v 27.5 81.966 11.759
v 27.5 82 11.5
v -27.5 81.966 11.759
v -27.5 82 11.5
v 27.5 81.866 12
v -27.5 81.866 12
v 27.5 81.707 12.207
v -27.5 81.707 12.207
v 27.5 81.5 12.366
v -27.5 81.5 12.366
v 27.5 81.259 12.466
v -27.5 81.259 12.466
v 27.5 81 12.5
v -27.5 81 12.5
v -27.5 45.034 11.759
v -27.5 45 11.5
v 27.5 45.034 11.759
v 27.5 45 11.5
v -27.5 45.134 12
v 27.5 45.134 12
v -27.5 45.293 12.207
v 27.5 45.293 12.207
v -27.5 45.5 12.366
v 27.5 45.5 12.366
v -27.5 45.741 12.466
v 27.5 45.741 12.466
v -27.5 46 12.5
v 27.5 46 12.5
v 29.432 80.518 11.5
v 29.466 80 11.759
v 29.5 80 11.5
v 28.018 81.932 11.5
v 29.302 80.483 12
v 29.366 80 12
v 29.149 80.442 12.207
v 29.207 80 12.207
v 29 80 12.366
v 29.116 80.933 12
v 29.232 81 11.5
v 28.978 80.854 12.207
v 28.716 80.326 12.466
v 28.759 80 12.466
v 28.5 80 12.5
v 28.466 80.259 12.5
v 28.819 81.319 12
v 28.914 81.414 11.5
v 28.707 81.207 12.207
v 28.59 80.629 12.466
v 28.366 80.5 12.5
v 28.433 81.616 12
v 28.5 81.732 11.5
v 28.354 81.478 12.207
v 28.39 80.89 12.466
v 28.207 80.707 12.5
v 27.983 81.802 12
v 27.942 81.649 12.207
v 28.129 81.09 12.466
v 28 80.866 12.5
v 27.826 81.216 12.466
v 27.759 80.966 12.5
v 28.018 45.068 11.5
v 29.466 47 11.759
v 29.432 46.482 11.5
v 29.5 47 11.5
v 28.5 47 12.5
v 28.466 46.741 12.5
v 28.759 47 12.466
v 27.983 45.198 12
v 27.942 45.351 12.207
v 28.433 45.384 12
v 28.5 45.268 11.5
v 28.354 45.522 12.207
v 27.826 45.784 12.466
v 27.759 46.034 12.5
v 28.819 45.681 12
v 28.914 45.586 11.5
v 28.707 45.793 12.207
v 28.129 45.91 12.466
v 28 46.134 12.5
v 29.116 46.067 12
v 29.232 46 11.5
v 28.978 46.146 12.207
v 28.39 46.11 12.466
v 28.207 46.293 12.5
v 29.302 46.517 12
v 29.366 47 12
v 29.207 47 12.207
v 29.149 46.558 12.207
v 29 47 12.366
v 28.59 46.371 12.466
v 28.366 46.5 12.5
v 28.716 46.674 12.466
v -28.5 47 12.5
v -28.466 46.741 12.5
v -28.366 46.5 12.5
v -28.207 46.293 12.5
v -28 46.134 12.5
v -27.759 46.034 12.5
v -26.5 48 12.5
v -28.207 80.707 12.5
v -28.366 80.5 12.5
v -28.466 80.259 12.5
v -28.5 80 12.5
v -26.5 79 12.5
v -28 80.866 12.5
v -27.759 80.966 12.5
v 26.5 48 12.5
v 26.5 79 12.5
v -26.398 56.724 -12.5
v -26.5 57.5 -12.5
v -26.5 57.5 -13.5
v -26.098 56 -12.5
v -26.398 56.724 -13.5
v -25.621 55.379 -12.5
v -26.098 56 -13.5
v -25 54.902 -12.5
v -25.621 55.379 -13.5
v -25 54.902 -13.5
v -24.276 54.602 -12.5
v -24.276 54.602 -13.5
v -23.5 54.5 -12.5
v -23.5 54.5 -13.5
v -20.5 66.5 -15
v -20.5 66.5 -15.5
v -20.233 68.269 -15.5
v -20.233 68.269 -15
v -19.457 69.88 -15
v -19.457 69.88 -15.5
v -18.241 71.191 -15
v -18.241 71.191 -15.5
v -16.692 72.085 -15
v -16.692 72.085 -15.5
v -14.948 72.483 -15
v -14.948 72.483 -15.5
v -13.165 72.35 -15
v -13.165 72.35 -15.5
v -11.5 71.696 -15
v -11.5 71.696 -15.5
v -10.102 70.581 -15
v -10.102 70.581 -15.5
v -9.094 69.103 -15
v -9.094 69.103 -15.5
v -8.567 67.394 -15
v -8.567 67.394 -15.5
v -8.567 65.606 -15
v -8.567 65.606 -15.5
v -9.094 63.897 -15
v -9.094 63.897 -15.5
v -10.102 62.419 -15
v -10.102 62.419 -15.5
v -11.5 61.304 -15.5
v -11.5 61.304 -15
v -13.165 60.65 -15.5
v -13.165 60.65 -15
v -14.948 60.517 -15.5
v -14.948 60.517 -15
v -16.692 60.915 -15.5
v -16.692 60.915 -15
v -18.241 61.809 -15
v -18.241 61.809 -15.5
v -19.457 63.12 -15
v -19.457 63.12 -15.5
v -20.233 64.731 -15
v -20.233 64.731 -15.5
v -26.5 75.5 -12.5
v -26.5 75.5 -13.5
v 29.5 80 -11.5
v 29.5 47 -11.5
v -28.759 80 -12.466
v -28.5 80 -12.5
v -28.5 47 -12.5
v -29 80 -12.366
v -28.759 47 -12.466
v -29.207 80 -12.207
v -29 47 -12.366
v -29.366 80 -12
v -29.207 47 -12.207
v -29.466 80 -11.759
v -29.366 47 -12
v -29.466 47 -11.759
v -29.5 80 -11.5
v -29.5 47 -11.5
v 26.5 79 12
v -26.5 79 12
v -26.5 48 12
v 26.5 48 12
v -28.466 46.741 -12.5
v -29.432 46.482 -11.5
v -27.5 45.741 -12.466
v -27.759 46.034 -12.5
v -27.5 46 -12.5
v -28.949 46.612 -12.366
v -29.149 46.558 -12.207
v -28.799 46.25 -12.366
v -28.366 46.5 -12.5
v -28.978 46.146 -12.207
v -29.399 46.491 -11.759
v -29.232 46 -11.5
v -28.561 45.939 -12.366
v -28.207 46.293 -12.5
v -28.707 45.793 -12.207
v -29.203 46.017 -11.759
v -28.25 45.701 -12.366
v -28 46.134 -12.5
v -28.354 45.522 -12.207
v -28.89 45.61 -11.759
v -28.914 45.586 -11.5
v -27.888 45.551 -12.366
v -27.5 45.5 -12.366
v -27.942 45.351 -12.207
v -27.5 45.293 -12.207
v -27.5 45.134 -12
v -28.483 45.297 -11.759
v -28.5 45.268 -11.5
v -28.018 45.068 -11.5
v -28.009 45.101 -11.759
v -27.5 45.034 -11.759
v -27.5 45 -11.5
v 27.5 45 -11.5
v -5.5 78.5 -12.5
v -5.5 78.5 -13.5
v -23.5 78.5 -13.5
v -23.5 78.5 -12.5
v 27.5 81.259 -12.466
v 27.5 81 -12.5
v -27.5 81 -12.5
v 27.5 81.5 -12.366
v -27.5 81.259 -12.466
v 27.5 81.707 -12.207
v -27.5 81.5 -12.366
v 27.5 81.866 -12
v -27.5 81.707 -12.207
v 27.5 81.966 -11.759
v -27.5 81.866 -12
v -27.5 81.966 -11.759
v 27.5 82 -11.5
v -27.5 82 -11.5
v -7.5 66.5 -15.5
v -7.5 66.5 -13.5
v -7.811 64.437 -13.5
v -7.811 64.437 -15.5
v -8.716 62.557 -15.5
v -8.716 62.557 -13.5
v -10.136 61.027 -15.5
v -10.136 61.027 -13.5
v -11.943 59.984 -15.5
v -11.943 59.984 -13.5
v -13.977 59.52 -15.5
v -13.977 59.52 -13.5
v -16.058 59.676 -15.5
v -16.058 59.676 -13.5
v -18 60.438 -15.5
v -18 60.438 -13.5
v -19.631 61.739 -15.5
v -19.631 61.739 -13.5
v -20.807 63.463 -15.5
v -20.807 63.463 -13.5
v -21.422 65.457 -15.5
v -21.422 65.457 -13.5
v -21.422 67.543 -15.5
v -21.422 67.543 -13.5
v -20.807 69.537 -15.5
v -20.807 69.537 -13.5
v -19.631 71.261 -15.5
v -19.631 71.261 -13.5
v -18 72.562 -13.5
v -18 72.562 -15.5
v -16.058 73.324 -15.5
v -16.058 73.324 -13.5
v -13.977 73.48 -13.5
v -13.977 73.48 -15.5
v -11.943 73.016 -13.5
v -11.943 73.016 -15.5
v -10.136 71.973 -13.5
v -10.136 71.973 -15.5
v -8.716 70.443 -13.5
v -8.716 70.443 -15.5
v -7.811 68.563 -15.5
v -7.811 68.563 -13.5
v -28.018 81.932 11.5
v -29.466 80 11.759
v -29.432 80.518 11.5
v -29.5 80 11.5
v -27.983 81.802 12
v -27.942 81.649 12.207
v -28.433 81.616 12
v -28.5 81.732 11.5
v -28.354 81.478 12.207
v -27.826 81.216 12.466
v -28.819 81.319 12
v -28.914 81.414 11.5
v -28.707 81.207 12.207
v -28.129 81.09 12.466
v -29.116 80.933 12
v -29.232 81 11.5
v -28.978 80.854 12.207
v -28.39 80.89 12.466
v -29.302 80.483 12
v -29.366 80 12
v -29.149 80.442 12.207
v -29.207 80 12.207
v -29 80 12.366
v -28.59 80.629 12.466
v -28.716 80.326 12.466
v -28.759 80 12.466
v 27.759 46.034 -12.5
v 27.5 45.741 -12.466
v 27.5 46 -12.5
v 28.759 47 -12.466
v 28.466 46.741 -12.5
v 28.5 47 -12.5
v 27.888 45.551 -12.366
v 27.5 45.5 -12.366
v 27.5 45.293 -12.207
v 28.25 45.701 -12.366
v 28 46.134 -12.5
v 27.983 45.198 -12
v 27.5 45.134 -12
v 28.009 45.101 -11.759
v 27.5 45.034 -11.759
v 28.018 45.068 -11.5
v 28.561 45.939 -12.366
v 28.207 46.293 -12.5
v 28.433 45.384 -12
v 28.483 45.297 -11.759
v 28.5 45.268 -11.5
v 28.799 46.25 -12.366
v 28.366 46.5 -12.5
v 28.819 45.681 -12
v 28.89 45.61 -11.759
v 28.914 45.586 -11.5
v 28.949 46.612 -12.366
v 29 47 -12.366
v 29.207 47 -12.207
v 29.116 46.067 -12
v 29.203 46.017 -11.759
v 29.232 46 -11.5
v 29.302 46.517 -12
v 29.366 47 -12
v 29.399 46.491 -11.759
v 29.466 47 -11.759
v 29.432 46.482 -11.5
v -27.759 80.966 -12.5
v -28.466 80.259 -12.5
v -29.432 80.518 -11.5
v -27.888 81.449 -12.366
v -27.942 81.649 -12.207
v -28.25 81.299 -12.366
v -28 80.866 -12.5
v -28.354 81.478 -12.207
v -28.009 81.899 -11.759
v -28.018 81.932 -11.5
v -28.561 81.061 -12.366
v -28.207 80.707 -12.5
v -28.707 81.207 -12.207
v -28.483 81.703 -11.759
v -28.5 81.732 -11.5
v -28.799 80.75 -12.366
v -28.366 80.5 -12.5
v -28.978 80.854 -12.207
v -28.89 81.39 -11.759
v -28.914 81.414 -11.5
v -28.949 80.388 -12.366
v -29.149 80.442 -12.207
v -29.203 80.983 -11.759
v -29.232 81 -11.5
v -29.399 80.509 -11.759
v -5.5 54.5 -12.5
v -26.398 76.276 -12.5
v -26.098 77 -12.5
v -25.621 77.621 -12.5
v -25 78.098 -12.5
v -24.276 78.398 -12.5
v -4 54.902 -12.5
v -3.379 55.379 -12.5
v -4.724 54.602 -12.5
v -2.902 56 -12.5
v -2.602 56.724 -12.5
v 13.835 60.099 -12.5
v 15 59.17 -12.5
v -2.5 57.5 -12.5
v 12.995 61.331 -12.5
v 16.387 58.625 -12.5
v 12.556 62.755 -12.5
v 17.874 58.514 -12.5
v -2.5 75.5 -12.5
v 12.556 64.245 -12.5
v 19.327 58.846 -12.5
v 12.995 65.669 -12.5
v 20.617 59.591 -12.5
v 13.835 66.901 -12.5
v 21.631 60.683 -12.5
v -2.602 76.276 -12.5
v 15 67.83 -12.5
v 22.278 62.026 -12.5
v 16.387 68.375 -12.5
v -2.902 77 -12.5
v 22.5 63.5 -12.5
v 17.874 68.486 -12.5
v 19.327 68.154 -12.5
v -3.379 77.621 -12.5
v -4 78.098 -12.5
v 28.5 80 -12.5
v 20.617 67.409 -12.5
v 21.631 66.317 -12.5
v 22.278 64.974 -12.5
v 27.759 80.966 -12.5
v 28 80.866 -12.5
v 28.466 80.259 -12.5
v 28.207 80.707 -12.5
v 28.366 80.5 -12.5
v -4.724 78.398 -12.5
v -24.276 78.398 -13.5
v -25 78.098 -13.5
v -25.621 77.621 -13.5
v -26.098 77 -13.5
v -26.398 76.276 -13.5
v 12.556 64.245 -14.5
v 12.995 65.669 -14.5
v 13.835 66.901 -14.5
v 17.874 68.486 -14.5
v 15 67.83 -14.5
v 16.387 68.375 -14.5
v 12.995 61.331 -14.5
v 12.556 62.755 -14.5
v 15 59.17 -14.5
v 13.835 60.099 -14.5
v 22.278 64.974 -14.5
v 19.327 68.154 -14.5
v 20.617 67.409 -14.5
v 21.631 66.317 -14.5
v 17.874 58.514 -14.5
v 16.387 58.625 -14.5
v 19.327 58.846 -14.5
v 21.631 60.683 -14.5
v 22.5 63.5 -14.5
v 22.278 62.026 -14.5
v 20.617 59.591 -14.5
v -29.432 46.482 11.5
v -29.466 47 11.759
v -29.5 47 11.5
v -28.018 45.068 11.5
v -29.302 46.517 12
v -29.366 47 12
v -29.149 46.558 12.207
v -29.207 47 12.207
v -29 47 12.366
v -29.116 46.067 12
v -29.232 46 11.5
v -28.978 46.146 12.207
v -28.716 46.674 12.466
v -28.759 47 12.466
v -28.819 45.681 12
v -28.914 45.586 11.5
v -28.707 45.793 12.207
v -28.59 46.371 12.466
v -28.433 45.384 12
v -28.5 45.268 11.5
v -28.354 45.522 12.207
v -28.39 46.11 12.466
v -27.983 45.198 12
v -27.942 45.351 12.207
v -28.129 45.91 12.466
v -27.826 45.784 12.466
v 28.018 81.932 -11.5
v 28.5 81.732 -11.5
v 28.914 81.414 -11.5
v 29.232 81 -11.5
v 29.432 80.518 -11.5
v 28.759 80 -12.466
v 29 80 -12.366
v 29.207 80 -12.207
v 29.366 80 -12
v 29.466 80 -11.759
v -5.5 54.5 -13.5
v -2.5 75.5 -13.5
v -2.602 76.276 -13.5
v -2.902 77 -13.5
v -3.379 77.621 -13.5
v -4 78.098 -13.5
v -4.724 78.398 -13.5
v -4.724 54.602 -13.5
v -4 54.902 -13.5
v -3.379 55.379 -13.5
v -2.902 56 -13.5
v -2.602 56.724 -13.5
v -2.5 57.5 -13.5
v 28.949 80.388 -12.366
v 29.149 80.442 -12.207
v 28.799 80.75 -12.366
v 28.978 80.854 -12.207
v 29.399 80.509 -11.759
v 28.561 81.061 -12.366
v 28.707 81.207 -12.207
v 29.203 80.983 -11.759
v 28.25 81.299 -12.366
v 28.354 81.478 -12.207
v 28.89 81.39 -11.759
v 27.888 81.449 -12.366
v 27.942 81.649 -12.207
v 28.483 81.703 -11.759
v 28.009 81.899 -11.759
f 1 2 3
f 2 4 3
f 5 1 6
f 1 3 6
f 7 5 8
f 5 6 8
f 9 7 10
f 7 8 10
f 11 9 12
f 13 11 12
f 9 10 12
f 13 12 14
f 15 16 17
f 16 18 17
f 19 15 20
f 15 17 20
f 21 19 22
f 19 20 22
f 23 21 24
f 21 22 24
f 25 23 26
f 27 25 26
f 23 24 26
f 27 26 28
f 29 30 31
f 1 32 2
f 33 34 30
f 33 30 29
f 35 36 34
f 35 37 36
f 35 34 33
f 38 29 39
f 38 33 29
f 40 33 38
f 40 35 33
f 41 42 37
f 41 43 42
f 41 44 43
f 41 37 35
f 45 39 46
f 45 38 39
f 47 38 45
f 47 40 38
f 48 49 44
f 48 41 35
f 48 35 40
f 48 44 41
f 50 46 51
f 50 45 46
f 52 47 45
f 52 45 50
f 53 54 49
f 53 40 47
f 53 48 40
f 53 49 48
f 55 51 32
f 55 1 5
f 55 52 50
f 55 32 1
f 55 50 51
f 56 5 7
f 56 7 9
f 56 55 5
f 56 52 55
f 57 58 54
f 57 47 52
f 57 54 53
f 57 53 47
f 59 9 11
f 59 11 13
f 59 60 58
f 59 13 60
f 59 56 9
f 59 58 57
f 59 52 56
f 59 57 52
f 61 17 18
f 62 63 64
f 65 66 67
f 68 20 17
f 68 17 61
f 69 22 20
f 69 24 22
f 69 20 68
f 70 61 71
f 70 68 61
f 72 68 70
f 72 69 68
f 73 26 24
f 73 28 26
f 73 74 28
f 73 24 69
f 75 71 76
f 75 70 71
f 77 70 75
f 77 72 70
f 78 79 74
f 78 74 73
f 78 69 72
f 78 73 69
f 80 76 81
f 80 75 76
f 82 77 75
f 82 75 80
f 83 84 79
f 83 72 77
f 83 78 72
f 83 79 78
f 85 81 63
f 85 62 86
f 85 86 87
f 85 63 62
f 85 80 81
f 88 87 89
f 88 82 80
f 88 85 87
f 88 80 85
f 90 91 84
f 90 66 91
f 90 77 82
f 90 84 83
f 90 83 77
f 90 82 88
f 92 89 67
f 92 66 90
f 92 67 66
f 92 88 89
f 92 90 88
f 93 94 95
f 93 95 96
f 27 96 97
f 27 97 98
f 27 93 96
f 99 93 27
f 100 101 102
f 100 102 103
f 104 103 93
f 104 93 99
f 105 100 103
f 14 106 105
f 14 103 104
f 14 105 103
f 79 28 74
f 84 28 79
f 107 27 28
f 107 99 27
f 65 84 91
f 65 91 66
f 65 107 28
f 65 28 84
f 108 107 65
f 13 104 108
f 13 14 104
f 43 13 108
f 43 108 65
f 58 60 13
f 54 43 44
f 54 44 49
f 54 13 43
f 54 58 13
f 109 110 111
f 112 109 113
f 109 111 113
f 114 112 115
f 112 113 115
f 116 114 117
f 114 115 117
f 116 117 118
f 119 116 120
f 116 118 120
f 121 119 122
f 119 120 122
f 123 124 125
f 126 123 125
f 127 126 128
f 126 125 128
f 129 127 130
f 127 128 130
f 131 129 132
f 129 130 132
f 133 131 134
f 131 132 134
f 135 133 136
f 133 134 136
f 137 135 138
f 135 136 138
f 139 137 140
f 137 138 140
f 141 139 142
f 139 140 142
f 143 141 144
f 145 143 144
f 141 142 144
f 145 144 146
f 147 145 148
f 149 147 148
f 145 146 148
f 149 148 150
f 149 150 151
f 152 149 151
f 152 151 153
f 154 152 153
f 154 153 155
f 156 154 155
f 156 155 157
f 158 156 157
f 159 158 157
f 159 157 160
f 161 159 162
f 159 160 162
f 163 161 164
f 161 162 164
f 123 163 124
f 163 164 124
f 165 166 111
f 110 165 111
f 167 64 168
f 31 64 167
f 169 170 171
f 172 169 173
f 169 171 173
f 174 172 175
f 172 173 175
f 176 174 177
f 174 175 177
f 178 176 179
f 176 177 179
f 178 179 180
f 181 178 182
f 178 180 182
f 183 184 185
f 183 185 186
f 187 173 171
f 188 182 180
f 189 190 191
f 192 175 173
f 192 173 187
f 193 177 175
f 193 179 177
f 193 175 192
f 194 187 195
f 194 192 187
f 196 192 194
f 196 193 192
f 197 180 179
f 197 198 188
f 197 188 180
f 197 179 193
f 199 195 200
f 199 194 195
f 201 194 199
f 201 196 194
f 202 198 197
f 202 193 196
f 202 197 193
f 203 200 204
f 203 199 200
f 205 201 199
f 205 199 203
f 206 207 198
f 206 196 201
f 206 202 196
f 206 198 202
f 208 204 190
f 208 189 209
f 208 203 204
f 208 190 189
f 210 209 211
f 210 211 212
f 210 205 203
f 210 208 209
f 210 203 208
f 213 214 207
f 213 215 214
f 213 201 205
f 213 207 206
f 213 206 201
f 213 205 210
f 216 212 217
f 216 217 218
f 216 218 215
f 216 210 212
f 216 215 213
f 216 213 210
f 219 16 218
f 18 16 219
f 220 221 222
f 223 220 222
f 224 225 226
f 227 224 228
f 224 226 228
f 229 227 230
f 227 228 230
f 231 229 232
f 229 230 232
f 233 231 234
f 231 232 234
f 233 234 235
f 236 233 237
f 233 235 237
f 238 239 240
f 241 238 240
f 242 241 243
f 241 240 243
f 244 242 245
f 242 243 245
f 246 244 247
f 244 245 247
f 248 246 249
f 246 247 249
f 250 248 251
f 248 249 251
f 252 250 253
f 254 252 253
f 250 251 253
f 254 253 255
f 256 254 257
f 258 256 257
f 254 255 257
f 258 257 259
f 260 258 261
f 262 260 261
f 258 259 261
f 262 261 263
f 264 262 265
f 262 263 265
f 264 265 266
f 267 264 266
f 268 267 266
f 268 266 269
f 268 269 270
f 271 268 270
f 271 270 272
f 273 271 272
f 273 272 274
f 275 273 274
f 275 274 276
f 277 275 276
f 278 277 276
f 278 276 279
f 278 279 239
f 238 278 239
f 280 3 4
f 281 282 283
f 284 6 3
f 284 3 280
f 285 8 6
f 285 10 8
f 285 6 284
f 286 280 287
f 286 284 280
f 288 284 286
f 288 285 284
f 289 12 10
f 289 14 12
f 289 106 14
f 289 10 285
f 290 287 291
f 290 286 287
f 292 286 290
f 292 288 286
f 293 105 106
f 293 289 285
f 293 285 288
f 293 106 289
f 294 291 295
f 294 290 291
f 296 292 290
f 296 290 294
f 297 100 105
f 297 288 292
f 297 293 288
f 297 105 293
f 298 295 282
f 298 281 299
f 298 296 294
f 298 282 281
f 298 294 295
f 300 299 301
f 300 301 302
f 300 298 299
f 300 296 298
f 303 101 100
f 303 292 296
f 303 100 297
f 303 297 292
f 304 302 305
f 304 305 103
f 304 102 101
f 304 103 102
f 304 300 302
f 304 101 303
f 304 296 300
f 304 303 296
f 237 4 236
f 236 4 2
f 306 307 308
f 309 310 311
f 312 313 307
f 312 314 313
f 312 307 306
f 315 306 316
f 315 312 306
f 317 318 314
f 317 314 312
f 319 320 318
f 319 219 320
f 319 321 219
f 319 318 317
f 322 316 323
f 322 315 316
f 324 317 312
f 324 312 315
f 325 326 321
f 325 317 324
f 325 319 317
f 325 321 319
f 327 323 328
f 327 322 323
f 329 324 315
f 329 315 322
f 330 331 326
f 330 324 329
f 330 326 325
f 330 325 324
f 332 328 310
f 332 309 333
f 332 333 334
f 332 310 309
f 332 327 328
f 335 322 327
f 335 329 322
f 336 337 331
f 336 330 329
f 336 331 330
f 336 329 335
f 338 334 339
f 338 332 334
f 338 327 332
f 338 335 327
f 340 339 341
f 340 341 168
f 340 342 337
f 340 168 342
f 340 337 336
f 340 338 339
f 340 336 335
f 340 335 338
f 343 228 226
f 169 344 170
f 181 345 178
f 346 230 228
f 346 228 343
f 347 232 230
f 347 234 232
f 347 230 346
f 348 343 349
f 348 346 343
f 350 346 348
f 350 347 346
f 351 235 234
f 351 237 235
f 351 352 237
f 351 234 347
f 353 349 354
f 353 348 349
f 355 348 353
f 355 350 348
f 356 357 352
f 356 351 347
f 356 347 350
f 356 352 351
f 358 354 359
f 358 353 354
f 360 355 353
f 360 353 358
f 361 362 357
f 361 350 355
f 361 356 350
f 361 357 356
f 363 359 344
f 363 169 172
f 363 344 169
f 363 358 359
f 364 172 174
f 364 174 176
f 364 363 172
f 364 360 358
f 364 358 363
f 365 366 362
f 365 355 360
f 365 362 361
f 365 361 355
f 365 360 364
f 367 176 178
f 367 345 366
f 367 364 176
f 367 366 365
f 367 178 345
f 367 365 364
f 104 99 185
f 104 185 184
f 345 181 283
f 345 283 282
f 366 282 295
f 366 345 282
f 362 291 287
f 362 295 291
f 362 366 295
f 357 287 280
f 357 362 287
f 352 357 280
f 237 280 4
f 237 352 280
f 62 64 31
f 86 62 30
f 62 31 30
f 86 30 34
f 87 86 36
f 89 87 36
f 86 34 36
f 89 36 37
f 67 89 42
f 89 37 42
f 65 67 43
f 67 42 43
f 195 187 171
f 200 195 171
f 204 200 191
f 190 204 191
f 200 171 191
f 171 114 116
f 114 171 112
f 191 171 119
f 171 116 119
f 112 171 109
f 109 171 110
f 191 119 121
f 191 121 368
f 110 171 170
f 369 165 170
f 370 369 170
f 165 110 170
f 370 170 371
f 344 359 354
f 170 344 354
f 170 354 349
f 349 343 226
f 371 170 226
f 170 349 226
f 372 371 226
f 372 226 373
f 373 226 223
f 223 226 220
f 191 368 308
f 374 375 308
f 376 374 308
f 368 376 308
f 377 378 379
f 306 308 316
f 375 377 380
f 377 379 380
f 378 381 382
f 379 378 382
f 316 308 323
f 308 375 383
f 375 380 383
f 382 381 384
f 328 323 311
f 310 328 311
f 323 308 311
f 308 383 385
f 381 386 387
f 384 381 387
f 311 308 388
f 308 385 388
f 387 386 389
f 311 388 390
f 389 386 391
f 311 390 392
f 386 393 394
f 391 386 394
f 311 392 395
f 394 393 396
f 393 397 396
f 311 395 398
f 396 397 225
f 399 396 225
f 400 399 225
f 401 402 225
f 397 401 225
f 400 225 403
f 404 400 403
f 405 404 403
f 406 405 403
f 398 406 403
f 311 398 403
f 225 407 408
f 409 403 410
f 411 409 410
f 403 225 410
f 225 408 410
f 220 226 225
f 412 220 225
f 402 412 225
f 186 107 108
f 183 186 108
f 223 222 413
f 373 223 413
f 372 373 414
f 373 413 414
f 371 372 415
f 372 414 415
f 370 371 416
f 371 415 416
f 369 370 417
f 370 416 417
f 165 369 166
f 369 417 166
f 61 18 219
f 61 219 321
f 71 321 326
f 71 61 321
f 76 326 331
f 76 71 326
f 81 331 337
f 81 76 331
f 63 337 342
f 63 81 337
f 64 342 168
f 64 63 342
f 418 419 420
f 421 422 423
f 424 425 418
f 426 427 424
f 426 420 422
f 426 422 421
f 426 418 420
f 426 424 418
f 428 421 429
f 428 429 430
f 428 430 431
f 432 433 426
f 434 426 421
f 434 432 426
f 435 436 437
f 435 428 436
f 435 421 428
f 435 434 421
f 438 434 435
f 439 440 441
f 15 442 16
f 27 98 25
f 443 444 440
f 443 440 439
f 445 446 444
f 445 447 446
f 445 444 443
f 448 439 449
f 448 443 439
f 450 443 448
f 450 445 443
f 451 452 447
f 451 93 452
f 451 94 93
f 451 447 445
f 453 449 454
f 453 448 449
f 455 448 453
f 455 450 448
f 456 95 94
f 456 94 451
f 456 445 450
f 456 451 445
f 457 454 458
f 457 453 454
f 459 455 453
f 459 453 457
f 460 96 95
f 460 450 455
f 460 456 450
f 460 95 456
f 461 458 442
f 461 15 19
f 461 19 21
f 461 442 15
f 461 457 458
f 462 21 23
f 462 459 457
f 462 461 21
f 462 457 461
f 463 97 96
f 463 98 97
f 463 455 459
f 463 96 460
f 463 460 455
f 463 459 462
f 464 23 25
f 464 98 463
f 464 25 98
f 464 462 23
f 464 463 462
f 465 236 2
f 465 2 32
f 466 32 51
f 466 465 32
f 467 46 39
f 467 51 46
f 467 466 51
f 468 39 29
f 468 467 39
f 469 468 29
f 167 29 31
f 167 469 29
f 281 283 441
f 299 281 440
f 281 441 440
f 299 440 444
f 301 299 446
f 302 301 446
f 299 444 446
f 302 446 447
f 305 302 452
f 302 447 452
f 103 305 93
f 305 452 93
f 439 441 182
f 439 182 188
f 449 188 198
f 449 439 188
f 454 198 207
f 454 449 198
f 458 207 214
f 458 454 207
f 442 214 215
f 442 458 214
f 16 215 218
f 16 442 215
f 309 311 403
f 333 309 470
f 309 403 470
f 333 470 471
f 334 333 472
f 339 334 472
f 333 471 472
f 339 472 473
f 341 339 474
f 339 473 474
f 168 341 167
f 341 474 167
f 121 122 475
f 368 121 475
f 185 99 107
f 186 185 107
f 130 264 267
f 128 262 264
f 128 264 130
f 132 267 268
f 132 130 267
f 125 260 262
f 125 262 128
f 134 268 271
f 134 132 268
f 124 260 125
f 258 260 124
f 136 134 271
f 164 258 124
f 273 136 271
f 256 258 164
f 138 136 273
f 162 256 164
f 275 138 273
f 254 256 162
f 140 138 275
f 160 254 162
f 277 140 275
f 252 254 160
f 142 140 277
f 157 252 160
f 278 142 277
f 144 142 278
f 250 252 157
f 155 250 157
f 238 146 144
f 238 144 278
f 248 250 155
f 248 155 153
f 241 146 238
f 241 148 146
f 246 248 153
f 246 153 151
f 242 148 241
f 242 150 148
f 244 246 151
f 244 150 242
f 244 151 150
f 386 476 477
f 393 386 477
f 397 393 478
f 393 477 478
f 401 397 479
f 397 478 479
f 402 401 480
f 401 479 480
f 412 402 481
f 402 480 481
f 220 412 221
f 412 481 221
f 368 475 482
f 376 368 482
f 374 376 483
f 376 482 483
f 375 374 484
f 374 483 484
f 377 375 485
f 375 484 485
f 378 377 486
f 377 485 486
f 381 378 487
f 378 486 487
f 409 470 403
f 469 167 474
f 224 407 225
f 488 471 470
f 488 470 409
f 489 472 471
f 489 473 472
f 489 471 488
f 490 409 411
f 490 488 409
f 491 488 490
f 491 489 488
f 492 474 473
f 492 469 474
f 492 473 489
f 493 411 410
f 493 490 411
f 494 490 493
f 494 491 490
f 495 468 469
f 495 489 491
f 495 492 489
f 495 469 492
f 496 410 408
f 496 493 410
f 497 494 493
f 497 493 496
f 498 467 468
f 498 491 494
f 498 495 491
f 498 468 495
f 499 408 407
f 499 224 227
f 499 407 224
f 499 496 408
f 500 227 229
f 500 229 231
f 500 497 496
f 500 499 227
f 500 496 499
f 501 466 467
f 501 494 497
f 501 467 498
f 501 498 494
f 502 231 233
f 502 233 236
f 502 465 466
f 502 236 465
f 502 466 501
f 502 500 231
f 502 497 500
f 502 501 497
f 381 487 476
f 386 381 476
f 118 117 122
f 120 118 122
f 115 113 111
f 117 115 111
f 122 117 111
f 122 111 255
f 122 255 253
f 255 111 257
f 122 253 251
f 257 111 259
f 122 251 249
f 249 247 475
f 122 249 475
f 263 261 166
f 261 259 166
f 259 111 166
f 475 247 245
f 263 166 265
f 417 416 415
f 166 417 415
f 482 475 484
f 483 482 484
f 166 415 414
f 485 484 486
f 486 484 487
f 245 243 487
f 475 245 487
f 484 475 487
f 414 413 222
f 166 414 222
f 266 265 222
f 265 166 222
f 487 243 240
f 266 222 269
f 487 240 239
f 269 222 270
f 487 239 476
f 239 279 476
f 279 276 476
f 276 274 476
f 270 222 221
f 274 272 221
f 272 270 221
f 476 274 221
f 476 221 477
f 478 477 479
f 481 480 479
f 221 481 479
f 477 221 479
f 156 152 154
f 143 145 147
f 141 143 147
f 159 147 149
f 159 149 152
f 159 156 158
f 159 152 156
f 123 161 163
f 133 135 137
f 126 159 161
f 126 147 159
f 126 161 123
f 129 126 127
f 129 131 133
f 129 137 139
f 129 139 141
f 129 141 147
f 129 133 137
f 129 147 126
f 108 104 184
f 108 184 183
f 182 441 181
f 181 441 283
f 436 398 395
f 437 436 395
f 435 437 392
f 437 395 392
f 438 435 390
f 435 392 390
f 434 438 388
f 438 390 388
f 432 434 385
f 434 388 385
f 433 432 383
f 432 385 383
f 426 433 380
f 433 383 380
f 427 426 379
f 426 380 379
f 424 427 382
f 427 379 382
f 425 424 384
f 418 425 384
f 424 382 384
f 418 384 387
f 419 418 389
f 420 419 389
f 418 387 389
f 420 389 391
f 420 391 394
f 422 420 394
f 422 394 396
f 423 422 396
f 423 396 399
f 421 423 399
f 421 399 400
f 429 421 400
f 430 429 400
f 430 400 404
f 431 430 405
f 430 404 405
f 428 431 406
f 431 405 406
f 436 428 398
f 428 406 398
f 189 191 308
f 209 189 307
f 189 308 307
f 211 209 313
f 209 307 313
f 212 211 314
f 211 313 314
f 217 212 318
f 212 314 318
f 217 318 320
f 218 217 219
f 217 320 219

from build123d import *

# Parameters (mm, degrees)
SKETCH1_W           = 59
SKETCH1_H           = 37
BOSS_EXTRUDE1_DEPTH = 12.5
SKETCH2_R           = 7
BOSS_EXTRUDE2_DEPTH = 3
FILLET1_R           = 2
BOSS_EXTRUDE3_DEPTH = 1
SKETCH4_R           = 6
CUT_EXTRUDE1_DEPTH  = 0.5
SKETCH5_R           = 5
BOSS_EXTRUDE4_DEPTH = 2
FILLET2_R           = 1
SKETCH6_W           = 53
SKETCH6_H           = 31
CUT_EXTRUDE2_DEPTH  = 0.5


with BuildPart() as part:
    # Sketch1 → Boss-Extrude1 (new, symmetric)
    with BuildSketch(Plane.XY):
        with Locations((0, 63.5)):
            Rectangle(SKETCH1_W, SKETCH1_H)
    extrude(amount=BOSS_EXTRUDE1_DEPTH, both=True)

    # Sketch2 → Boss-Extrude2 (add)
    with BuildSketch(Plane(origin=(0, 0, -12.5), x_dir=(-1, 0, 0), z_dir=(0, 0, -1))):
        with Locations(Location((14.5, 66.5, 0), (0, 0, 180))):
            Circle(SKETCH2_R)
    extrude(amount=BOSS_EXTRUDE2_DEPTH)

    # Fillet1
    fillet1_edges = [part.edges().sort_by_distance(p)[0] for p in [
        (-29.5, 82, 0),
        (29.5, 82, 0),
        (29.5, 45, 0),
        (-29.5, 45, 0),
    ]]
    fillet(fillet1_edges, radius=FILLET1_R)

    # Sketch3 → Boss-Extrude3 (add, symmetric)
    with BuildSketch(Plane(origin=(0, 0, -12.5), x_dir=(-1, 0, 0), z_dir=(0, 0, -1))):
        with BuildLine():
            Line((5.5, 78.5), (23.5, 78.5))
            ThreePointArc((23.5, 78.5), (25.621320344, 77.621320344), (26.5, 75.5))
            Line((26.5, 75.5), (26.5, 57.5))
            ThreePointArc((26.5, 57.5), (25.621320344, 55.378679656), (23.5, 54.5))
            Line((23.5, 54.5), (5.5, 54.5))
            ThreePointArc((5.5, 54.5), (3.378679656, 55.378679656), (2.5, 57.5))
            Line((2.5, 57.5), (2.5, 75.5))
            ThreePointArc((2.5, 75.5), (3.378679656, 77.621320344), (5.5, 78.5))
        make_face()
    extrude(amount=BOSS_EXTRUDE3_DEPTH, both=True)

    # Sketch4 → Cut-Extrude1 (cut)
    with BuildSketch(Plane(origin=(0, 0, -15.5), x_dir=(-1, 0, 0), z_dir=(0, 0, -1))):
        with Locations((14.5, 66.5)):
            Circle(SKETCH4_R)
    extrude(amount=-CUT_EXTRUDE1_DEPTH, mode=Mode.SUBTRACT)

    # Sketch5 → Boss-Extrude4 (add)
    with BuildSketch(Plane(origin=(0, 0, -12.5), x_dir=(-1, 0, 0), z_dir=(0, 0, -1))):
        with Locations(Location((-17.5, 63.5, 0), (0, 0, 180))):
            Circle(SKETCH5_R)
    extrude(amount=BOSS_EXTRUDE4_DEPTH)

    # Fillet2
    fillet2_edges = [part.edges().sort_by_distance(p)[0] for p in [
        (29.5, 63.5, -12.5),
        (29.5, 63.5, 12.5),
        (-29.5, 63.5, -12.5),
        (0, 82, -12.5),
        (0, 45, -12.5),
        (-28.914213562, 81.414213562, -12.5),
        (-28.914213562, 45.585786438, -12.5),
        (28.914213562, 81.414213562, -12.5),
        (28.914213562, 45.585786438, -12.5),
        (0, 45, 12.5),
        (-29.5, 63.5, 12.5),
        (0, 82, 12.5),
        (-28.914213562, 81.414213562, 12.5),
        (-28.914213562, 45.585786438, 12.5),
        (28.914213562, 81.414213562, 12.5),
        (28.914213562, 45.585786438, 12.5),
    ]]
    fillet(fillet2_edges, radius=FILLET2_R)

    # Sketch6 → Cut-Extrude2 (cut)
    with BuildSketch(Plane.XY.offset(12.5)):
        with Locations((0, 63.5)):
            Rectangle(SKETCH6_W, SKETCH6_H)
    extrude(amount=-CUT_EXTRUDE2_DEPTH, mode=Mode.SUBTRACT)


solid = part.part
